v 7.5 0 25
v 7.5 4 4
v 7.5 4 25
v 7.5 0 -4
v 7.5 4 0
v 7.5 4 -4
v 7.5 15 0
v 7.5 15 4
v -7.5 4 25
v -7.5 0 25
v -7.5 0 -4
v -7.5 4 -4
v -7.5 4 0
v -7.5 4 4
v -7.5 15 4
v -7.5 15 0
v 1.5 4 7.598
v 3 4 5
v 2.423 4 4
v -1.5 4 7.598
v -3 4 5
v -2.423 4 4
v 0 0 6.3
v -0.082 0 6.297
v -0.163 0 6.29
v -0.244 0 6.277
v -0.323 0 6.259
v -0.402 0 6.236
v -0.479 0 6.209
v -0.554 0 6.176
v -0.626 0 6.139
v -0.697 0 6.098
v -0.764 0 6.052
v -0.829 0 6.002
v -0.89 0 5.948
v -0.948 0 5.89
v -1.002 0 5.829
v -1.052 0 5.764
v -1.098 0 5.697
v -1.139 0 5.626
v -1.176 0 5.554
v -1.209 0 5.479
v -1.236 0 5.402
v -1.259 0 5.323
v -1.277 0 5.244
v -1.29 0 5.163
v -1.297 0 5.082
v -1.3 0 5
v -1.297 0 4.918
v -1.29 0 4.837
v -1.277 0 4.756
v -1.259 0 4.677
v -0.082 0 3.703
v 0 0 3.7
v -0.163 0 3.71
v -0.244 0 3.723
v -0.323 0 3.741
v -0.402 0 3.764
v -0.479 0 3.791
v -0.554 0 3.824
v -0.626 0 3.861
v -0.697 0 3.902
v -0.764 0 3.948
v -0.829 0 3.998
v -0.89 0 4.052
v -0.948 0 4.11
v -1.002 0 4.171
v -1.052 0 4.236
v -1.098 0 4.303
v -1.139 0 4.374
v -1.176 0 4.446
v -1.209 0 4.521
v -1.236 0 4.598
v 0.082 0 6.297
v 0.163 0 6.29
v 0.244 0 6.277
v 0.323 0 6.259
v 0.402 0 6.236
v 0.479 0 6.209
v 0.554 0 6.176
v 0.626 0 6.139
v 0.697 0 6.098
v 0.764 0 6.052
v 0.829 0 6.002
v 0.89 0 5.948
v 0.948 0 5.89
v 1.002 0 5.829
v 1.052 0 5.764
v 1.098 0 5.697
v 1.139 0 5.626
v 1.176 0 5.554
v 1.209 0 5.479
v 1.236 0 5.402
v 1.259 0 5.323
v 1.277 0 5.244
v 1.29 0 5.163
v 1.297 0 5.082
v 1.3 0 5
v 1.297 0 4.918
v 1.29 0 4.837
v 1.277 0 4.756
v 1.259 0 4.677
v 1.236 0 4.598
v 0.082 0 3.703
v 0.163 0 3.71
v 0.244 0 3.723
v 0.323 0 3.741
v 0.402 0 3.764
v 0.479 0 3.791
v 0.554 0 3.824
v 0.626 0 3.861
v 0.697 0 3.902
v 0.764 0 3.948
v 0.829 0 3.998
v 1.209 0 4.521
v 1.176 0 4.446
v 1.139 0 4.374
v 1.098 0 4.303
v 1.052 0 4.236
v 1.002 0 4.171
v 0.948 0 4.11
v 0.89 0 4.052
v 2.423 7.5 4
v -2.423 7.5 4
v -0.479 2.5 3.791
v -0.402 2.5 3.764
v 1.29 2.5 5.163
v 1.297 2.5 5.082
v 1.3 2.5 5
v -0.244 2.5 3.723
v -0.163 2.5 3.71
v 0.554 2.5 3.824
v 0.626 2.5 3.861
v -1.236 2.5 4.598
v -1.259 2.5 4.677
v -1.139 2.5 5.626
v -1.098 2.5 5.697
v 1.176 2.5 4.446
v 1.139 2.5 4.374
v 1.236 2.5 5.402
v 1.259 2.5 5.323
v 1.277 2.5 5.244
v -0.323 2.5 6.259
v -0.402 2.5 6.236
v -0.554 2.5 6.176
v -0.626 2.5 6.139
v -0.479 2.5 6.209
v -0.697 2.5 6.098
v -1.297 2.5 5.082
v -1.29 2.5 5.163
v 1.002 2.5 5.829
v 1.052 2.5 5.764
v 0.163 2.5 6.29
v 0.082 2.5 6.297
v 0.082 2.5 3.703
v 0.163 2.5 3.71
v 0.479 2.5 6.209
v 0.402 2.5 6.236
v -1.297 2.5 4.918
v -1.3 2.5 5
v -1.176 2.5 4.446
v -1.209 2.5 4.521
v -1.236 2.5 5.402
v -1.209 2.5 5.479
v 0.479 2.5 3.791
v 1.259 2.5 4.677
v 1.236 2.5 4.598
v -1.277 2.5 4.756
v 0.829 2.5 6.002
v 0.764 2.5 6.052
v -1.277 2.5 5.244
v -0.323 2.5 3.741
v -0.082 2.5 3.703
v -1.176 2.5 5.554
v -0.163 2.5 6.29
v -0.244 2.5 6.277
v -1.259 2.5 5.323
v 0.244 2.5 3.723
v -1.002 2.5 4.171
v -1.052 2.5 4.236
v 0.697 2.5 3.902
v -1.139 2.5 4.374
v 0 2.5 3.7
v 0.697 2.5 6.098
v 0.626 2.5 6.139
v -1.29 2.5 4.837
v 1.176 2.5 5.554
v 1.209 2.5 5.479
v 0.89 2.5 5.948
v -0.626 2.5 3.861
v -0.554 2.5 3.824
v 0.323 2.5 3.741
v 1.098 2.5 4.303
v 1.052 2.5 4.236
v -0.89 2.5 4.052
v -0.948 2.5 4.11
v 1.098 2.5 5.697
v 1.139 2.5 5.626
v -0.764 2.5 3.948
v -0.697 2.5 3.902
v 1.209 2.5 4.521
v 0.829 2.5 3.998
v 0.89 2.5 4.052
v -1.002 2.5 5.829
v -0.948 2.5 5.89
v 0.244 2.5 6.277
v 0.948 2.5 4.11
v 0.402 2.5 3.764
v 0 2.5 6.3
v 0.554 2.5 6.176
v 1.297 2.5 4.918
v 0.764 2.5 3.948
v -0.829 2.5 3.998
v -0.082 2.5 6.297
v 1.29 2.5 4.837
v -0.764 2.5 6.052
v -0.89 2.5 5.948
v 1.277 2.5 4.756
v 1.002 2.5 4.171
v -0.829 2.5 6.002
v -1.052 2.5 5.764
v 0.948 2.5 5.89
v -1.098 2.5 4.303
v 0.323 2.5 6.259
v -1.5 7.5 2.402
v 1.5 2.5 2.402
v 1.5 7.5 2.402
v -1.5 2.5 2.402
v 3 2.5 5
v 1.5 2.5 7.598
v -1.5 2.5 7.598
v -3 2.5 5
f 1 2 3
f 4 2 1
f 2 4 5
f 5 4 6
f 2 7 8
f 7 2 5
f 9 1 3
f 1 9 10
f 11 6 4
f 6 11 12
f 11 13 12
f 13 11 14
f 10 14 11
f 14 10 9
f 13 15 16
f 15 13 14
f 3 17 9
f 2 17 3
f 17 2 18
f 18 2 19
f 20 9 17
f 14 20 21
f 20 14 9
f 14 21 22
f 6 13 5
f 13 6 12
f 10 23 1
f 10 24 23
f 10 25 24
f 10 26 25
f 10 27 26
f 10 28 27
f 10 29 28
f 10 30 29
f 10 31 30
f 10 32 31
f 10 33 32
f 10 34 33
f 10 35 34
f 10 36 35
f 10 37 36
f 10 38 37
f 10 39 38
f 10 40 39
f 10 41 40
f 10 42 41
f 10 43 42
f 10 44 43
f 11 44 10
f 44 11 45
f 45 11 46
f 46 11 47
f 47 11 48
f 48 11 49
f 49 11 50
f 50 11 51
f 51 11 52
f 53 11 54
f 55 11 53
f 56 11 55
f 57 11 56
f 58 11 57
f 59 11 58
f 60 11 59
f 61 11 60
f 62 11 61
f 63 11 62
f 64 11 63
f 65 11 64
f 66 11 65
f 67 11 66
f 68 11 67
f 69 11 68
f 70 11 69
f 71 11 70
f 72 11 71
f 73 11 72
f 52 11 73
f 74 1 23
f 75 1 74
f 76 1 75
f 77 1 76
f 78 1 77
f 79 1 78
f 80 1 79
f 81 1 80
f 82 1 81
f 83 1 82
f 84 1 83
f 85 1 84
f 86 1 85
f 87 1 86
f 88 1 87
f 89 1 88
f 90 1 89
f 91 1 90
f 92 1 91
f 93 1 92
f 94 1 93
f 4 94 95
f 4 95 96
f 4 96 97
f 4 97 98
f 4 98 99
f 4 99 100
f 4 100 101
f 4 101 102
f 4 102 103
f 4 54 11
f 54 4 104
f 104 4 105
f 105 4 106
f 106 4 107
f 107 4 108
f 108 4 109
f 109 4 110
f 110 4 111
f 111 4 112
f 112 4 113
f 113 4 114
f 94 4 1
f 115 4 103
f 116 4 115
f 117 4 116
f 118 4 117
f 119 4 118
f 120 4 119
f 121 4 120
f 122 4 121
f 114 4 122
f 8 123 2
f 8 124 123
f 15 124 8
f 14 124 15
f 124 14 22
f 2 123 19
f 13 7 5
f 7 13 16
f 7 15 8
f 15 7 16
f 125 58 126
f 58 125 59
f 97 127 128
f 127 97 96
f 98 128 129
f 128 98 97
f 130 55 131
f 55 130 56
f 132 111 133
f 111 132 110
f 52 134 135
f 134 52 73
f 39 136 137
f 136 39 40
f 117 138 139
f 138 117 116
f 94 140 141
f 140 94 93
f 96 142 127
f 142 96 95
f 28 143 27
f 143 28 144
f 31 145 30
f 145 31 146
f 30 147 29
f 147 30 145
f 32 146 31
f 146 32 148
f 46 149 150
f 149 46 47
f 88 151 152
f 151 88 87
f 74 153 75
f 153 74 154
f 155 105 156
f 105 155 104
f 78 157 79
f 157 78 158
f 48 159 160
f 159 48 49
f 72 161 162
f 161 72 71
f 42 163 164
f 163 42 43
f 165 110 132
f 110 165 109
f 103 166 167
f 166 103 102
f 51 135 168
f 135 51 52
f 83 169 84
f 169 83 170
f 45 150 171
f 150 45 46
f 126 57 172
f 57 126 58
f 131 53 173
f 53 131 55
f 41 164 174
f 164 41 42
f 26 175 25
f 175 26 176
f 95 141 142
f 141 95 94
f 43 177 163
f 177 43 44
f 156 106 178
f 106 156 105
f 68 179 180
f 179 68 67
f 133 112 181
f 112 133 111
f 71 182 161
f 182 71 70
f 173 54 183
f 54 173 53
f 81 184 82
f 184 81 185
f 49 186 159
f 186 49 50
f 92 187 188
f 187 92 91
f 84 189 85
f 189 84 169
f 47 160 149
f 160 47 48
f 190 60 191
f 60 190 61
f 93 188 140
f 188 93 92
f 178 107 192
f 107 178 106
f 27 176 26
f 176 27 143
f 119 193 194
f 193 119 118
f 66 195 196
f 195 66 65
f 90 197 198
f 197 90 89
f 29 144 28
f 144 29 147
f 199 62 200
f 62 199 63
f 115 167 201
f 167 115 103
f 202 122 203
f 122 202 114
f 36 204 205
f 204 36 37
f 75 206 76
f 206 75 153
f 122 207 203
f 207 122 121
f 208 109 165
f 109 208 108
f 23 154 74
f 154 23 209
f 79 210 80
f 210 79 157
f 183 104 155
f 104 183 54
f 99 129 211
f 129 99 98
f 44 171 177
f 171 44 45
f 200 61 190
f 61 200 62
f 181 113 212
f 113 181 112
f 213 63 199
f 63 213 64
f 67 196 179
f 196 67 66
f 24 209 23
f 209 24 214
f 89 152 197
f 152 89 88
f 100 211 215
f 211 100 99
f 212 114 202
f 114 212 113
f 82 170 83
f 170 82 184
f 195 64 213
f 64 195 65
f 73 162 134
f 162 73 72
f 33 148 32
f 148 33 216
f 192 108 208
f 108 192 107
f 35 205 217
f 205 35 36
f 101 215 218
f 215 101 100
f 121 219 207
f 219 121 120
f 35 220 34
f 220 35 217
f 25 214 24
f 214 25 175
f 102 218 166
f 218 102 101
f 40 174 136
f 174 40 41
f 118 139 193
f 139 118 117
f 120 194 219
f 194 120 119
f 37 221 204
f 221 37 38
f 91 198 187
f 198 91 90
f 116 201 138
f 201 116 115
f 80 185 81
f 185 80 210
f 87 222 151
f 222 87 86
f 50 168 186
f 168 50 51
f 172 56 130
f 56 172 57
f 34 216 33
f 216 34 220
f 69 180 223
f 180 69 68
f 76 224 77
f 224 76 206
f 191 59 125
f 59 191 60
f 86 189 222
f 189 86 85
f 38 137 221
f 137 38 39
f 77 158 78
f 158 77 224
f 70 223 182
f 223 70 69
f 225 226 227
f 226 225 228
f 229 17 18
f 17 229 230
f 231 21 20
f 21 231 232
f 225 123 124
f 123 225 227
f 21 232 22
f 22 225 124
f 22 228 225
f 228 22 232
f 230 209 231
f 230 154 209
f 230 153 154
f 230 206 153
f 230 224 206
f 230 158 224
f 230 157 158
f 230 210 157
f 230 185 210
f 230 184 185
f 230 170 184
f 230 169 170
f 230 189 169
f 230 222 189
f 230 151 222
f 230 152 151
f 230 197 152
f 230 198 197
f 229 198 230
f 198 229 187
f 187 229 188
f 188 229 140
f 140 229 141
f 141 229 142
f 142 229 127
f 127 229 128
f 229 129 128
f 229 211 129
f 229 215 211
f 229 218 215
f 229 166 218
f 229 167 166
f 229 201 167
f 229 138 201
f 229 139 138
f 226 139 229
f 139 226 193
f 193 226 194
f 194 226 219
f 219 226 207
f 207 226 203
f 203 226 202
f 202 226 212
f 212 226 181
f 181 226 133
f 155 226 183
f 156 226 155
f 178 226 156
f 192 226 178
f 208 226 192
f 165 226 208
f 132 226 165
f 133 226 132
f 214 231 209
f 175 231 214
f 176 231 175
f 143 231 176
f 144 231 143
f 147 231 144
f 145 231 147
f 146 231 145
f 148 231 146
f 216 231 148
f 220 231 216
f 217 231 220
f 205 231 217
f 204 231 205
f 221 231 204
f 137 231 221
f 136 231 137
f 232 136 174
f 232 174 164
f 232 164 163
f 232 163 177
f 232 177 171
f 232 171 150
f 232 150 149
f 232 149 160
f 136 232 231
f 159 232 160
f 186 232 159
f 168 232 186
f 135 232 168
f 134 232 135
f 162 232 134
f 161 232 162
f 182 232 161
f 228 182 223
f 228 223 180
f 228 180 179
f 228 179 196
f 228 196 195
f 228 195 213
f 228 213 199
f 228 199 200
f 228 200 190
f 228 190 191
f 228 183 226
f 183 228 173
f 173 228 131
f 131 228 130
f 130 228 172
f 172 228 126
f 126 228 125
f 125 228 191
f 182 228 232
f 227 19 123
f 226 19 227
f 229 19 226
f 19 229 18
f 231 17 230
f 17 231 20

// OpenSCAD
cDepthChassies = 4; //талщина акрила
cDepth = 4; //толщина креплений
cLength = 15; //длина крепления
cHeight = 15; //ширина крепления



difference()
{
	translate([-cHeight / 2,0,-cDepthChassies])
	union()
	{
		cube([cHeight, cDepth, 20 + 5 + 4]);
		translate ([0,0, cDepthChassies])cube([cHeight, cLength, cDepth]);
	}
	
	//дырки под крепеж
	translate([0, 0, 5]) rotate ([90,0,0]) cylinder (h = 10, r=2.6/2, center = true, $fn=100);
	translate([0, 5, 5]) rotate ([90,0,0]) cylinder (h = 5, r=6.0/2, center = true, $fn=6);
}
